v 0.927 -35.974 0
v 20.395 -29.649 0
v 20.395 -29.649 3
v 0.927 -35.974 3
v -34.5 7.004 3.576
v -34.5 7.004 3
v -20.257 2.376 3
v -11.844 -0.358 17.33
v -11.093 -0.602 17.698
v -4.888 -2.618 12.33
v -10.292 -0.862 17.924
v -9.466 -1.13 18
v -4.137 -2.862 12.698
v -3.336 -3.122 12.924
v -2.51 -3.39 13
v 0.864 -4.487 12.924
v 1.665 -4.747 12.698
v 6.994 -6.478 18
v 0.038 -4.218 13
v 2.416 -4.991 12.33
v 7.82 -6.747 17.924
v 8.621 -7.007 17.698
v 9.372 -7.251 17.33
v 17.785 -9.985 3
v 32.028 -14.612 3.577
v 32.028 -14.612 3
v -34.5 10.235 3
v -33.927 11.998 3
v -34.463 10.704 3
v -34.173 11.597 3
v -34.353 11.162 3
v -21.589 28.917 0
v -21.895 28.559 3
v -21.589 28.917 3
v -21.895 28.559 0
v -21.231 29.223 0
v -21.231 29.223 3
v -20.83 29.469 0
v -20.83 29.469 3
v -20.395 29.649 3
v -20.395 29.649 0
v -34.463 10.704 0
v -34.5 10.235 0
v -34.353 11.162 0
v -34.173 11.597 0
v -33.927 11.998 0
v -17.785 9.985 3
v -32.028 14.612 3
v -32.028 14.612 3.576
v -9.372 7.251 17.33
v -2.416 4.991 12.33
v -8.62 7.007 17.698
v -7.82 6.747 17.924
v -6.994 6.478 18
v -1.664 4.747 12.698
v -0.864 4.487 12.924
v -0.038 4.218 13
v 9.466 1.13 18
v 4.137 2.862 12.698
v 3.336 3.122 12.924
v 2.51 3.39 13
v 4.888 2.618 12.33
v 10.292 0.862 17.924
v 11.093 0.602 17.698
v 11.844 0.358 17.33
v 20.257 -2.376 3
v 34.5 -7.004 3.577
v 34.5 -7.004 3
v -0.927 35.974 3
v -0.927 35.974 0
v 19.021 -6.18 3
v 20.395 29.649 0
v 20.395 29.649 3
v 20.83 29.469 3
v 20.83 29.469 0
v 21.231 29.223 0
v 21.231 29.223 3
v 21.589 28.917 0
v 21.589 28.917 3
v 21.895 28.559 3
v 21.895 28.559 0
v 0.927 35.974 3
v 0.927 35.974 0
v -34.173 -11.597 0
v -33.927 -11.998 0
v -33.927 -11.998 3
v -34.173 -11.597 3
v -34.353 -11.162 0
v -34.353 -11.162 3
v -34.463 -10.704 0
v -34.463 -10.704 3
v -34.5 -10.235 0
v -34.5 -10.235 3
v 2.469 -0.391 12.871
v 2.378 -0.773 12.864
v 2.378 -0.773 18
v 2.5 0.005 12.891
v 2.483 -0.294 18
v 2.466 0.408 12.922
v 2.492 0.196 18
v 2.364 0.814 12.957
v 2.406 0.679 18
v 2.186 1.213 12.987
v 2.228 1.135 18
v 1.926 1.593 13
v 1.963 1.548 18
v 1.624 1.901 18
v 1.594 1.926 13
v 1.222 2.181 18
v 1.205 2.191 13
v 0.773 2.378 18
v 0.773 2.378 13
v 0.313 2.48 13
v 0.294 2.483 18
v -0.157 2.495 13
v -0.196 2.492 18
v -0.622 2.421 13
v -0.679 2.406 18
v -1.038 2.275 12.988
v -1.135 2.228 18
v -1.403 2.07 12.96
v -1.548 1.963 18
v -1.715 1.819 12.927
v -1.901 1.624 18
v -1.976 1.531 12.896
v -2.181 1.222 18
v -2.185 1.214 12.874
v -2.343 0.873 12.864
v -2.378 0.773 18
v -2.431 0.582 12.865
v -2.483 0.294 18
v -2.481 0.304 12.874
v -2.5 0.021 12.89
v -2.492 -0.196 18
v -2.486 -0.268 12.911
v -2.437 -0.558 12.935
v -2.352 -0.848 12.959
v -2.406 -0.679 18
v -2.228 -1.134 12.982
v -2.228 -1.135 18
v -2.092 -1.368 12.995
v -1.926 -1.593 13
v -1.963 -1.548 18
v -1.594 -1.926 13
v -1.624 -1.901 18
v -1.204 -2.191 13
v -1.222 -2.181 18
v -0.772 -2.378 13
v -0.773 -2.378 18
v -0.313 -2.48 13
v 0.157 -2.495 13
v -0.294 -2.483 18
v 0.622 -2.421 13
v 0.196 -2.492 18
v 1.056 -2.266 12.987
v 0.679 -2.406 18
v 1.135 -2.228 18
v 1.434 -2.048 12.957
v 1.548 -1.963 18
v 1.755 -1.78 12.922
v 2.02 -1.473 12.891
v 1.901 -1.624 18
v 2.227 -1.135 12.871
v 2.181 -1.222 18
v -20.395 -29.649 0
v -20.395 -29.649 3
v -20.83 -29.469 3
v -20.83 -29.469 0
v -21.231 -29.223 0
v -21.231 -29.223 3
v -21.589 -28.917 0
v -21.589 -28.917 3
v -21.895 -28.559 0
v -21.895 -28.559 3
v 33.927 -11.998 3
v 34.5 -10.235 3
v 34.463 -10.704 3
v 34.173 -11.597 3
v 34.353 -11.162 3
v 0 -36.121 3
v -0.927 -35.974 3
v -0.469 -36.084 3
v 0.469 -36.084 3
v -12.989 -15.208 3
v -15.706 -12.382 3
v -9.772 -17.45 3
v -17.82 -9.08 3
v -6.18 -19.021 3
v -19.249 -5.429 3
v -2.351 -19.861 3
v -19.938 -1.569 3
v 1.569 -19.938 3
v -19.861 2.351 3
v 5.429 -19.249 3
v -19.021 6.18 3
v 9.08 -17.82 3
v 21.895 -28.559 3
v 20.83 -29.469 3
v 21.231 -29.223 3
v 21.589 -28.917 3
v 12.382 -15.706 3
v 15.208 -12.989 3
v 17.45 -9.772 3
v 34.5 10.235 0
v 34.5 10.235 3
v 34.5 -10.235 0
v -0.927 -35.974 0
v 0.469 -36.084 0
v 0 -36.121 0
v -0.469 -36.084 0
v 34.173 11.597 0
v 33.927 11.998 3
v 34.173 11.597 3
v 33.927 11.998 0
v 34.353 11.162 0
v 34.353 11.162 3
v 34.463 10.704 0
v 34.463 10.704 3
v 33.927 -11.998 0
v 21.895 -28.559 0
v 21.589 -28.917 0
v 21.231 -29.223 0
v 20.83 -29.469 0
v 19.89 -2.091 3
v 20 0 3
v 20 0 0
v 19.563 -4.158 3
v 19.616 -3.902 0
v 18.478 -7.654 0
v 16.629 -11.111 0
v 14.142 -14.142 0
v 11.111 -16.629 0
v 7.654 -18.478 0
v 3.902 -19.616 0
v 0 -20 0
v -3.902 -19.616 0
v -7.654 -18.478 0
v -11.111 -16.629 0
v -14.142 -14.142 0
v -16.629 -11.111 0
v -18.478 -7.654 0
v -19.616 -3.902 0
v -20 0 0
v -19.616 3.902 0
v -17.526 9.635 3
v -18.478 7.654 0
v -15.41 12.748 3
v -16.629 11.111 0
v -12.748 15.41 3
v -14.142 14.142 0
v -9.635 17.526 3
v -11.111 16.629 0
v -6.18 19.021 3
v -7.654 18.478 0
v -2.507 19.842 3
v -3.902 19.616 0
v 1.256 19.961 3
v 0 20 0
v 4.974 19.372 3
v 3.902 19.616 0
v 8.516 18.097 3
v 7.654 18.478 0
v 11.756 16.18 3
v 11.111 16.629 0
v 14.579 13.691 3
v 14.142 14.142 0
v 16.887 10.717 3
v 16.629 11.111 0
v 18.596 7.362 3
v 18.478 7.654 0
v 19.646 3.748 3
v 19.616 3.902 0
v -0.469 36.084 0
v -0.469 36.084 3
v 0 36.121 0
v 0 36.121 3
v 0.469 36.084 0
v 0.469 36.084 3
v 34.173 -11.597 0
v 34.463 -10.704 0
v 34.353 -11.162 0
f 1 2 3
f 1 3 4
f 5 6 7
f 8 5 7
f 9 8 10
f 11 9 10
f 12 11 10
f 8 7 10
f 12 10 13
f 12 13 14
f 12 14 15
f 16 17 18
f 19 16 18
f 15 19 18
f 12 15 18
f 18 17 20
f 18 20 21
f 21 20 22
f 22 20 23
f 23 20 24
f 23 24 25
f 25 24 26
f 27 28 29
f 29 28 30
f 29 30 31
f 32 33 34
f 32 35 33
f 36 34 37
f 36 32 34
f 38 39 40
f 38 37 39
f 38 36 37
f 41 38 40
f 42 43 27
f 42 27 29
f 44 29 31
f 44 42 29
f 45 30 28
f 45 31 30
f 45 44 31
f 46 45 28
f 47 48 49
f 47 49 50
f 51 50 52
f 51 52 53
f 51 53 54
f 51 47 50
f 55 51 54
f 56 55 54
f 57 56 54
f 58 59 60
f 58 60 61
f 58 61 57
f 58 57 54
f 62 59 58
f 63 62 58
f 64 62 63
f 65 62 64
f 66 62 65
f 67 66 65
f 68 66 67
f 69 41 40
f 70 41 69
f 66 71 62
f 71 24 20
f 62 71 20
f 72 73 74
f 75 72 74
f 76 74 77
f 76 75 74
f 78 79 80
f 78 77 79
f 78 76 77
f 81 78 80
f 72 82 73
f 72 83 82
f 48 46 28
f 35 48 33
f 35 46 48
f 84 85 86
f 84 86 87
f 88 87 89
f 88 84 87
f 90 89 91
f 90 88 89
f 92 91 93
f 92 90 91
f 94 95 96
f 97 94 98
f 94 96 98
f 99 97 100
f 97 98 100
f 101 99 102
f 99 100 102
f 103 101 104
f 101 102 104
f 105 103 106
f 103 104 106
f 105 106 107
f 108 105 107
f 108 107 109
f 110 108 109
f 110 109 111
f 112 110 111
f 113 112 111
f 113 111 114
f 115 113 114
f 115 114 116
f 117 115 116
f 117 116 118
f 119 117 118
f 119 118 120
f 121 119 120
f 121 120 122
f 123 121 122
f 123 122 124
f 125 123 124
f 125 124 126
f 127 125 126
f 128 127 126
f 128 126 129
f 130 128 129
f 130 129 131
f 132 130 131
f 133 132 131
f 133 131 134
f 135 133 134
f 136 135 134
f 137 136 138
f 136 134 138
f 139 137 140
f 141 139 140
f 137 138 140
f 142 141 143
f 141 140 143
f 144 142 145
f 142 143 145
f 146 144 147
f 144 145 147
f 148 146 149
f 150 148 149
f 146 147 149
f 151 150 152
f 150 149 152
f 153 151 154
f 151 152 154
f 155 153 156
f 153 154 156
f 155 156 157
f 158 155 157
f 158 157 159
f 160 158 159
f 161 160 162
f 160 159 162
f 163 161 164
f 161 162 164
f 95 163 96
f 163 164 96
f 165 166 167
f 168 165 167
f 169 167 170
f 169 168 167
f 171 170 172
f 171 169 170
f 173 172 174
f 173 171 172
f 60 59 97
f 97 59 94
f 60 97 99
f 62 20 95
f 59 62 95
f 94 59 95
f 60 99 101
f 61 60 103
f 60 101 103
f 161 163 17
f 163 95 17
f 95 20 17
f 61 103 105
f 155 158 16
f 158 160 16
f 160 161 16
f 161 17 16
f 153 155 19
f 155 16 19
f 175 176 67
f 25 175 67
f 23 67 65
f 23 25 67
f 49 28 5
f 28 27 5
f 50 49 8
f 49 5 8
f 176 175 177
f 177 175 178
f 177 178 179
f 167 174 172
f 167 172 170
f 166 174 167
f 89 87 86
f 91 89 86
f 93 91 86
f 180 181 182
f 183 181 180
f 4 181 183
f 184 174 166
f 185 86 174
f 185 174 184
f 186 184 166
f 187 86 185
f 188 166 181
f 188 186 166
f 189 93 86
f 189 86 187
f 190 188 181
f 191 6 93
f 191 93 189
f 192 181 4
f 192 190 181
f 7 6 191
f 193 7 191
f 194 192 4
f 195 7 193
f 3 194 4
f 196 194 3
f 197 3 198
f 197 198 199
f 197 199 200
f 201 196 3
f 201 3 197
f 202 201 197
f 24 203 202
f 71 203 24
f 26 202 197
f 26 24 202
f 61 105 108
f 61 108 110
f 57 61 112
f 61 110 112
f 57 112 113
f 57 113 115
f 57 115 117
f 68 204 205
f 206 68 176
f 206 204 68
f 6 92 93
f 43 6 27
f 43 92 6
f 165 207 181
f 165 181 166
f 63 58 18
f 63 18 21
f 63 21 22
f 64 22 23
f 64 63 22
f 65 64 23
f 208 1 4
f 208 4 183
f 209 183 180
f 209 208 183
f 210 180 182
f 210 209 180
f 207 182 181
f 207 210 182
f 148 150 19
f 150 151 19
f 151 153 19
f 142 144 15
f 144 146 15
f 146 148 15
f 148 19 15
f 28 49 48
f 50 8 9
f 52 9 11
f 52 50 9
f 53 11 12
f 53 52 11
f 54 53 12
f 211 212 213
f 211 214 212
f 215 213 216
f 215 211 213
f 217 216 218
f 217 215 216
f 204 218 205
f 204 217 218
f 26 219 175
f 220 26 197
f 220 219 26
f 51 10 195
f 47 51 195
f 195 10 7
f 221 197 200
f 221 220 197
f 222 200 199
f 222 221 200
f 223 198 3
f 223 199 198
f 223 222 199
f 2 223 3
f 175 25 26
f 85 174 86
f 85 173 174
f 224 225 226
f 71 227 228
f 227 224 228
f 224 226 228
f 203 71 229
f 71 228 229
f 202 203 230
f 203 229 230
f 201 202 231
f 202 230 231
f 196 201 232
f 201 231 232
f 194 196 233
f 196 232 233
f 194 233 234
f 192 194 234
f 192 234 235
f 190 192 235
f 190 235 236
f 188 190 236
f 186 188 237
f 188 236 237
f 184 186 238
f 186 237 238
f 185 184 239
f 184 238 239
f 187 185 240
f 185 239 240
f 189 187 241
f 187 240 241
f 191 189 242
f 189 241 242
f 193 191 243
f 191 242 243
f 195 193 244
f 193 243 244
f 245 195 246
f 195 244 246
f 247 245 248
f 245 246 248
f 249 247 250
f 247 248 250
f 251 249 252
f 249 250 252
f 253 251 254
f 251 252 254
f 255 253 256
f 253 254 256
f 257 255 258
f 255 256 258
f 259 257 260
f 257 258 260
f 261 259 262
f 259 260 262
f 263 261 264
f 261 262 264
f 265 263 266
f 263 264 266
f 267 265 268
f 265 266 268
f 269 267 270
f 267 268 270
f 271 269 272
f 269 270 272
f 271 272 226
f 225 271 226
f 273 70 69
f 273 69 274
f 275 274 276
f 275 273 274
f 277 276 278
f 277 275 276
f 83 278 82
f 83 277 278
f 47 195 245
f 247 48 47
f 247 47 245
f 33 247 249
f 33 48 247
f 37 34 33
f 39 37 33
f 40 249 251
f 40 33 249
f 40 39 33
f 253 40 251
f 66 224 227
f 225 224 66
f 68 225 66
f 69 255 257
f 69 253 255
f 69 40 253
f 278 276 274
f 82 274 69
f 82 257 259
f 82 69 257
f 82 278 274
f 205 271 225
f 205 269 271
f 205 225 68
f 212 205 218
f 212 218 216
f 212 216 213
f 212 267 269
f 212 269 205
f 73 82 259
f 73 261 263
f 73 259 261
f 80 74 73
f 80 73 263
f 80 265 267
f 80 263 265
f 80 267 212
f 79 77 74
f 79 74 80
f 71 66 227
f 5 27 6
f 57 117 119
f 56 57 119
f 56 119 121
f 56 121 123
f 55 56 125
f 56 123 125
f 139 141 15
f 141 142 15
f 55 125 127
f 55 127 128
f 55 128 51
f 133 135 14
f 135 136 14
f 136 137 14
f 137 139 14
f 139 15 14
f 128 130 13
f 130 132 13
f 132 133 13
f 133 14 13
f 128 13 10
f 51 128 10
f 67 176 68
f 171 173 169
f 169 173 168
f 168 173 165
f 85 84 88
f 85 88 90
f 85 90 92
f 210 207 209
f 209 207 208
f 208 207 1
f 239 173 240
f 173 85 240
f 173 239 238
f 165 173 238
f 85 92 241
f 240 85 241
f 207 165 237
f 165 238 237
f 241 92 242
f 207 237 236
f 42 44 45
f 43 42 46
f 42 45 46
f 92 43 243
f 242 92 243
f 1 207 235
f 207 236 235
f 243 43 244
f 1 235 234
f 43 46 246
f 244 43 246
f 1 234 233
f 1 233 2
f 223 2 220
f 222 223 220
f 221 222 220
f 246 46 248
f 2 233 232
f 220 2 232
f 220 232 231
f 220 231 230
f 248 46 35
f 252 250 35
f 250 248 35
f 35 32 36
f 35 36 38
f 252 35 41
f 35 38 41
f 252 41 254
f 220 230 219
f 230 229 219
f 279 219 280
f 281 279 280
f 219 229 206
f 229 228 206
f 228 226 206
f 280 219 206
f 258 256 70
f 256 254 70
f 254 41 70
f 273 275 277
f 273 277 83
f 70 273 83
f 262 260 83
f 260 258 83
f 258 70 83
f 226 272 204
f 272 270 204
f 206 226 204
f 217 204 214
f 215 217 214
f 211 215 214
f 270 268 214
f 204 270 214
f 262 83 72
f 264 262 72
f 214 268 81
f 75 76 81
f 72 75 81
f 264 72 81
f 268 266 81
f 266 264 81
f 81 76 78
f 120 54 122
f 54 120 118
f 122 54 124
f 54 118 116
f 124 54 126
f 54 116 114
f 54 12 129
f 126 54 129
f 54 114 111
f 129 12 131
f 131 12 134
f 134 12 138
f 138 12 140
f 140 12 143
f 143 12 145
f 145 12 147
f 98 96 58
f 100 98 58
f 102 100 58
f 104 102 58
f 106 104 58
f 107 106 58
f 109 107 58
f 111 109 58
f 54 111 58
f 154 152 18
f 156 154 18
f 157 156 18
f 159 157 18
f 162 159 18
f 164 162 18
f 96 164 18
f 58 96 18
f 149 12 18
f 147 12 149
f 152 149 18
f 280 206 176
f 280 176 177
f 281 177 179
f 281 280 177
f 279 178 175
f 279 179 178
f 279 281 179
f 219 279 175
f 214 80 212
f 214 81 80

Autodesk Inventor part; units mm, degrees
ref_plane "YZ Plane" through (0, 0, 0) normal (1, 0, 0) x (0, 1, 0)
ref_plane "XZ Plane" through (0, 0, 0) normal (0, 1, 0) x (-1, 0, 0)
ref_plane "XY Plane" through (0, 0, 0) normal (0, 0, 1) x (1, 0, 0)
ref_plane "Arbeitsebene1" through (0, 0, 0) normal (0, 0, 1) x (1, 0, 0)
sketch "Skizze1" plane through (0, 0, 0) normal (0, 0, 1) x (1, 0, 0)
  arc A0 (-34.5, -10.235) -> (-33.9271, -11.9983) centre (-31.5, -10.235) ccw projected
  line L0 (-21.8951, -28.5589) -> (-33.9271, -11.9983) projected
  arc A1 (-21.8951, -28.5589) -> (-20.3951, -29.6487) centre (-19.4681, -26.7955) ccw projected
  line L1 (-0.9271, -35.9742) -> (-20.3951, -29.6487) projected
  arc A2 (-0.9271, -35.9742) -> (0.9271, -35.9742) centre (0, -33.1211) ccw projected
  line L2 (20.3951, -29.6487) -> (0.9271, -35.9742) projected
  arc A3 (20.3951, -29.6487) -> (21.8951, -28.5589) centre (19.4681, -26.7955) ccw projected
  line L3 (33.9271, -11.9983) -> (21.8951, -28.5589) projected
  arc A4 (33.9271, -11.9983) -> (34.5, -10.235) centre (31.5, -10.235) ccw projected
  line L4 (34.5, 10.235) -> (34.5, -10.235) projected
  arc A5 (34.5, 10.235) -> (33.9271, 11.9983) centre (31.5, 10.235) ccw projected
  line L5 (21.8951, 28.5589) -> (33.9271, 11.9983) projected
  arc A6 (21.8951, 28.5589) -> (20.3951, 29.6487) centre (19.4681, 26.7955) ccw projected
  line L6 (0.9271, 35.9742) -> (20.3951, 29.6487) projected
  arc A7 (0.9271, 35.9742) -> (-0.9271, 35.9742) centre (0, 33.1211) ccw projected
  line L7 (-20.3951, 29.6487) -> (-0.9271, 35.9742) projected
  arc A8 (-20.3951, 29.6487) -> (-21.8951, 28.5589) centre (-19.4681, 26.7955) ccw projected
  line L8 (-33.9271, 11.9983) -> (-21.8951, 28.5589) projected
  arc A9 (-33.9271, 11.9983) -> (-34.5, 10.235) centre (-31.5, 10.235) ccw projected
  line L9 (-34.5, -10.235) -> (-34.5, 10.235) projected
  circle A10 centre (0, 0) radius 20
  dimension "d0" = 40
extrude "Extrusion1" add sketch "Skizze1" along normal blind 3
ref_plane "Arbeitsebene2" through (-9.734, 3.1628, 3) normal (0.309017, 0.9510565, 0) x (0.9510565, -0.309017, 0)
sketch "Skizze2" plane through (-9.734, 3.1628, 3) normal (0.309017, 0.9510565, 0) x (0.9510565, -0.309017, 0)
  line L0 (46.2092, 3) -> (46.2092, 0) projected
  line L1 (-25.7393, 3) -> (-25.7393, 0) projected
  line L2 (30.235, 0) -> (-9.765, 0) projected
  line L3 (46.2092, 0) -> (20.2284, -15)
  line L4 (46.2092, 0) -> (76.2092, 0) construction
  line L5 (-25.7393, 0) -> (-19.4137, 0) projected
  line L6 (-25.7393, 0) -> (0.2415, -15)
  line L7 (0.2415, -15) -> (20.2284, -15)
  line L8 (30.235, 0) -> (12.9145, -10)
  line L9 (12.9145, -10) -> (7.5555, -10)
  line L10 (7.5555, -10) -> (-9.765, 0)
  line L11 (-25.7393, 0) -> (-9.765, 0)
  line L12 (30.235, 0) -> (46.2092, 0)
  point P0 (10.235, 3)
  point P1 (-19.4137, 0)
  dimension "d3" = 30
  dimension "d4" = 150
  dimension "d5" = 30
  dimension "d6" = 5
extrude "Extrusion2" add sketch "Skizze2" along normal mid plane 8 contours L12 L3 L7 L6 L5 L11 L10 L9 L8
sketch "Skizze3" plane through (-8.2683, 6.8924, 18) normal (0, 0, 1) x (0.9510565, -0.309017, 0)
  line L0 (44.9692, -8) -> (29.9935, -8) projected
  line L1 (29.9935, -8) -> (29.9935, -4) projected
  arc A0 (-10.0065, -4) -> (29.9935, -4) centre (9.9935, -4) ccw projected
  line L2 (-10.0065, -4) -> (-10.0065, -8) projected
  line L3 (-10.0065, -8) -> (-24.9823, -8) projected
  line L4 (-24.9823, -8) -> (-19.6552, -24.3951) projected
  arc A1 (-19.6552, -24.3951) -> (-18.5654, -25.8951) centre (-16.802, -23.4681) ccw projected
  line L5 (-18.5654, -25.8951) -> (-2.0049, -37.9271) projected
  arc A2 (-2.0049, -37.9271) -> (-0.2415, -38.5) centre (-0.2415, -35.5) ccw projected
  line L6 (-0.2415, -38.5) -> (20.2284, -38.5) projected
  arc A3 (20.2284, -38.5) -> (21.9918, -37.9271) centre (20.2284, -35.5) ccw projected
  line L7 (21.9918, -37.9271) -> (38.5523, -25.8951) projected
  arc A4 (38.5523, -25.8951) -> (39.6421, -24.3951) centre (36.789, -23.4681) ccw projected
  line L8 (39.6421, -24.3951) -> (44.9692, -8) projected
  line L9 (44.9692, -8) -> (45.9677, -4.9271) projected
  line L10 (29.9935, -4) -> (29.9935, 0) projected
  line L11 (29.9935, 0) -> (44.9692, 0) projected
  line L12 (44.9692, 0) -> (39.6421, 16.3951) projected
  arc A5 (39.6421, 16.3951) -> (38.5523, 17.8951) centre (36.789, 15.4681) ccw projected
  line L13 (38.5523, 17.8951) -> (21.9918, 29.9271) projected
  arc A6 (21.9918, 29.9271) -> (20.2284, 30.5) centre (20.2284, 27.5) ccw projected
  line L14 (20.2284, 30.5) -> (-0.2415, 30.5) projected
  arc A7 (-0.2415, 30.5) -> (-2.0049, 29.9271) centre (-0.2415, 27.5) ccw projected
  line L15 (-2.0049, 29.9271) -> (-18.5654, 17.8951) projected
  arc A8 (-18.5654, 17.8951) -> (-19.6552, 16.3951) centre (-16.802, 15.4681) ccw projected
  line L16 (-19.6552, 16.3951) -> (-24.9823, 0) projected
  line L17 (-24.9823, 0) -> (-10.0065, 0) projected
  line L18 (-10.0065, 0) -> (-10.0065, -4) projected
  arc A9 (29.9935, -4) -> (-10.0065, -4) centre (9.9935, -4) ccw projected
  line L19 (-24.9823, 0) -> (-25.9808, -3.0729) projected
  line L20 (-25.9808, -4.9271) -> (-24.9823, -8) projected
  line L21 (-25.9808, -4.9271) -> (-25.9808, -3.0729) projected
  line L22 (45.9677, -3.0729) -> (44.9692, 0) projected
  arc A10 (45.9677, -4.9271) -> (45.9677, -3.0729) centre (43.1145, -4) ccw projected
  circle A11 centre (9.9935, -4) radius 2.5
  line L23 (0, -8) -> (0, 0) projected
  line L24 (-25.9808, 0) -> (0, 0) projected
  line L25 (-25.9808, -3.0729) -> (-25.9808, 0) projected
  line L26 (-25.9808, -4.9271) -> (-25.9808, -3.0729) projected
  line L27 (-25.9808, -8) -> (-25.9808, -4.9271) projected
  line L28 (0, -8) -> (-25.9808, -8) projected
  line L29 (45.9677, -8) -> (45.9677, -4.9271) projected
  line L30 (45.9677, -3.0729) -> (45.9677, -4.9271) projected
  line L31 (45.9677, -3.0729) -> (45.9677, 0) projected
  line L32 (19.9869, 0) -> (45.9677, 0) projected
  line L33 (19.9869, -8) -> (19.9869, 0) projected
  line L34 (45.9677, -8) -> (19.9869, -8) projected
  point P0 (-24.9823, 0)
  point P1 (-25.9808, -4.9271)
  point P2 (-24.9823, -8)
  point P3 (45.9677, -3.0729)
  point P4 (44.9692, 0)
  point P5 (45.9677, -4.9271)
  point P6 (44.9692, -8)
  dimension "d9" = 5
extrude "Extrusion3" cut sketch "Skizze3" against normal through all contours L9 L29 L34 | L22 L32 L31 | L28 L27 L20 | L19 L25 L24 | A11
fillet "Rundung1" radius 5 4 edges at (9.5044, -3.0882, 18) (-9.5044, 3.0882, 18) (2.5483, -0.828, 13) (-2.5483, 0.828, 13)
properties part number "Anglerfish_Lightplate"
